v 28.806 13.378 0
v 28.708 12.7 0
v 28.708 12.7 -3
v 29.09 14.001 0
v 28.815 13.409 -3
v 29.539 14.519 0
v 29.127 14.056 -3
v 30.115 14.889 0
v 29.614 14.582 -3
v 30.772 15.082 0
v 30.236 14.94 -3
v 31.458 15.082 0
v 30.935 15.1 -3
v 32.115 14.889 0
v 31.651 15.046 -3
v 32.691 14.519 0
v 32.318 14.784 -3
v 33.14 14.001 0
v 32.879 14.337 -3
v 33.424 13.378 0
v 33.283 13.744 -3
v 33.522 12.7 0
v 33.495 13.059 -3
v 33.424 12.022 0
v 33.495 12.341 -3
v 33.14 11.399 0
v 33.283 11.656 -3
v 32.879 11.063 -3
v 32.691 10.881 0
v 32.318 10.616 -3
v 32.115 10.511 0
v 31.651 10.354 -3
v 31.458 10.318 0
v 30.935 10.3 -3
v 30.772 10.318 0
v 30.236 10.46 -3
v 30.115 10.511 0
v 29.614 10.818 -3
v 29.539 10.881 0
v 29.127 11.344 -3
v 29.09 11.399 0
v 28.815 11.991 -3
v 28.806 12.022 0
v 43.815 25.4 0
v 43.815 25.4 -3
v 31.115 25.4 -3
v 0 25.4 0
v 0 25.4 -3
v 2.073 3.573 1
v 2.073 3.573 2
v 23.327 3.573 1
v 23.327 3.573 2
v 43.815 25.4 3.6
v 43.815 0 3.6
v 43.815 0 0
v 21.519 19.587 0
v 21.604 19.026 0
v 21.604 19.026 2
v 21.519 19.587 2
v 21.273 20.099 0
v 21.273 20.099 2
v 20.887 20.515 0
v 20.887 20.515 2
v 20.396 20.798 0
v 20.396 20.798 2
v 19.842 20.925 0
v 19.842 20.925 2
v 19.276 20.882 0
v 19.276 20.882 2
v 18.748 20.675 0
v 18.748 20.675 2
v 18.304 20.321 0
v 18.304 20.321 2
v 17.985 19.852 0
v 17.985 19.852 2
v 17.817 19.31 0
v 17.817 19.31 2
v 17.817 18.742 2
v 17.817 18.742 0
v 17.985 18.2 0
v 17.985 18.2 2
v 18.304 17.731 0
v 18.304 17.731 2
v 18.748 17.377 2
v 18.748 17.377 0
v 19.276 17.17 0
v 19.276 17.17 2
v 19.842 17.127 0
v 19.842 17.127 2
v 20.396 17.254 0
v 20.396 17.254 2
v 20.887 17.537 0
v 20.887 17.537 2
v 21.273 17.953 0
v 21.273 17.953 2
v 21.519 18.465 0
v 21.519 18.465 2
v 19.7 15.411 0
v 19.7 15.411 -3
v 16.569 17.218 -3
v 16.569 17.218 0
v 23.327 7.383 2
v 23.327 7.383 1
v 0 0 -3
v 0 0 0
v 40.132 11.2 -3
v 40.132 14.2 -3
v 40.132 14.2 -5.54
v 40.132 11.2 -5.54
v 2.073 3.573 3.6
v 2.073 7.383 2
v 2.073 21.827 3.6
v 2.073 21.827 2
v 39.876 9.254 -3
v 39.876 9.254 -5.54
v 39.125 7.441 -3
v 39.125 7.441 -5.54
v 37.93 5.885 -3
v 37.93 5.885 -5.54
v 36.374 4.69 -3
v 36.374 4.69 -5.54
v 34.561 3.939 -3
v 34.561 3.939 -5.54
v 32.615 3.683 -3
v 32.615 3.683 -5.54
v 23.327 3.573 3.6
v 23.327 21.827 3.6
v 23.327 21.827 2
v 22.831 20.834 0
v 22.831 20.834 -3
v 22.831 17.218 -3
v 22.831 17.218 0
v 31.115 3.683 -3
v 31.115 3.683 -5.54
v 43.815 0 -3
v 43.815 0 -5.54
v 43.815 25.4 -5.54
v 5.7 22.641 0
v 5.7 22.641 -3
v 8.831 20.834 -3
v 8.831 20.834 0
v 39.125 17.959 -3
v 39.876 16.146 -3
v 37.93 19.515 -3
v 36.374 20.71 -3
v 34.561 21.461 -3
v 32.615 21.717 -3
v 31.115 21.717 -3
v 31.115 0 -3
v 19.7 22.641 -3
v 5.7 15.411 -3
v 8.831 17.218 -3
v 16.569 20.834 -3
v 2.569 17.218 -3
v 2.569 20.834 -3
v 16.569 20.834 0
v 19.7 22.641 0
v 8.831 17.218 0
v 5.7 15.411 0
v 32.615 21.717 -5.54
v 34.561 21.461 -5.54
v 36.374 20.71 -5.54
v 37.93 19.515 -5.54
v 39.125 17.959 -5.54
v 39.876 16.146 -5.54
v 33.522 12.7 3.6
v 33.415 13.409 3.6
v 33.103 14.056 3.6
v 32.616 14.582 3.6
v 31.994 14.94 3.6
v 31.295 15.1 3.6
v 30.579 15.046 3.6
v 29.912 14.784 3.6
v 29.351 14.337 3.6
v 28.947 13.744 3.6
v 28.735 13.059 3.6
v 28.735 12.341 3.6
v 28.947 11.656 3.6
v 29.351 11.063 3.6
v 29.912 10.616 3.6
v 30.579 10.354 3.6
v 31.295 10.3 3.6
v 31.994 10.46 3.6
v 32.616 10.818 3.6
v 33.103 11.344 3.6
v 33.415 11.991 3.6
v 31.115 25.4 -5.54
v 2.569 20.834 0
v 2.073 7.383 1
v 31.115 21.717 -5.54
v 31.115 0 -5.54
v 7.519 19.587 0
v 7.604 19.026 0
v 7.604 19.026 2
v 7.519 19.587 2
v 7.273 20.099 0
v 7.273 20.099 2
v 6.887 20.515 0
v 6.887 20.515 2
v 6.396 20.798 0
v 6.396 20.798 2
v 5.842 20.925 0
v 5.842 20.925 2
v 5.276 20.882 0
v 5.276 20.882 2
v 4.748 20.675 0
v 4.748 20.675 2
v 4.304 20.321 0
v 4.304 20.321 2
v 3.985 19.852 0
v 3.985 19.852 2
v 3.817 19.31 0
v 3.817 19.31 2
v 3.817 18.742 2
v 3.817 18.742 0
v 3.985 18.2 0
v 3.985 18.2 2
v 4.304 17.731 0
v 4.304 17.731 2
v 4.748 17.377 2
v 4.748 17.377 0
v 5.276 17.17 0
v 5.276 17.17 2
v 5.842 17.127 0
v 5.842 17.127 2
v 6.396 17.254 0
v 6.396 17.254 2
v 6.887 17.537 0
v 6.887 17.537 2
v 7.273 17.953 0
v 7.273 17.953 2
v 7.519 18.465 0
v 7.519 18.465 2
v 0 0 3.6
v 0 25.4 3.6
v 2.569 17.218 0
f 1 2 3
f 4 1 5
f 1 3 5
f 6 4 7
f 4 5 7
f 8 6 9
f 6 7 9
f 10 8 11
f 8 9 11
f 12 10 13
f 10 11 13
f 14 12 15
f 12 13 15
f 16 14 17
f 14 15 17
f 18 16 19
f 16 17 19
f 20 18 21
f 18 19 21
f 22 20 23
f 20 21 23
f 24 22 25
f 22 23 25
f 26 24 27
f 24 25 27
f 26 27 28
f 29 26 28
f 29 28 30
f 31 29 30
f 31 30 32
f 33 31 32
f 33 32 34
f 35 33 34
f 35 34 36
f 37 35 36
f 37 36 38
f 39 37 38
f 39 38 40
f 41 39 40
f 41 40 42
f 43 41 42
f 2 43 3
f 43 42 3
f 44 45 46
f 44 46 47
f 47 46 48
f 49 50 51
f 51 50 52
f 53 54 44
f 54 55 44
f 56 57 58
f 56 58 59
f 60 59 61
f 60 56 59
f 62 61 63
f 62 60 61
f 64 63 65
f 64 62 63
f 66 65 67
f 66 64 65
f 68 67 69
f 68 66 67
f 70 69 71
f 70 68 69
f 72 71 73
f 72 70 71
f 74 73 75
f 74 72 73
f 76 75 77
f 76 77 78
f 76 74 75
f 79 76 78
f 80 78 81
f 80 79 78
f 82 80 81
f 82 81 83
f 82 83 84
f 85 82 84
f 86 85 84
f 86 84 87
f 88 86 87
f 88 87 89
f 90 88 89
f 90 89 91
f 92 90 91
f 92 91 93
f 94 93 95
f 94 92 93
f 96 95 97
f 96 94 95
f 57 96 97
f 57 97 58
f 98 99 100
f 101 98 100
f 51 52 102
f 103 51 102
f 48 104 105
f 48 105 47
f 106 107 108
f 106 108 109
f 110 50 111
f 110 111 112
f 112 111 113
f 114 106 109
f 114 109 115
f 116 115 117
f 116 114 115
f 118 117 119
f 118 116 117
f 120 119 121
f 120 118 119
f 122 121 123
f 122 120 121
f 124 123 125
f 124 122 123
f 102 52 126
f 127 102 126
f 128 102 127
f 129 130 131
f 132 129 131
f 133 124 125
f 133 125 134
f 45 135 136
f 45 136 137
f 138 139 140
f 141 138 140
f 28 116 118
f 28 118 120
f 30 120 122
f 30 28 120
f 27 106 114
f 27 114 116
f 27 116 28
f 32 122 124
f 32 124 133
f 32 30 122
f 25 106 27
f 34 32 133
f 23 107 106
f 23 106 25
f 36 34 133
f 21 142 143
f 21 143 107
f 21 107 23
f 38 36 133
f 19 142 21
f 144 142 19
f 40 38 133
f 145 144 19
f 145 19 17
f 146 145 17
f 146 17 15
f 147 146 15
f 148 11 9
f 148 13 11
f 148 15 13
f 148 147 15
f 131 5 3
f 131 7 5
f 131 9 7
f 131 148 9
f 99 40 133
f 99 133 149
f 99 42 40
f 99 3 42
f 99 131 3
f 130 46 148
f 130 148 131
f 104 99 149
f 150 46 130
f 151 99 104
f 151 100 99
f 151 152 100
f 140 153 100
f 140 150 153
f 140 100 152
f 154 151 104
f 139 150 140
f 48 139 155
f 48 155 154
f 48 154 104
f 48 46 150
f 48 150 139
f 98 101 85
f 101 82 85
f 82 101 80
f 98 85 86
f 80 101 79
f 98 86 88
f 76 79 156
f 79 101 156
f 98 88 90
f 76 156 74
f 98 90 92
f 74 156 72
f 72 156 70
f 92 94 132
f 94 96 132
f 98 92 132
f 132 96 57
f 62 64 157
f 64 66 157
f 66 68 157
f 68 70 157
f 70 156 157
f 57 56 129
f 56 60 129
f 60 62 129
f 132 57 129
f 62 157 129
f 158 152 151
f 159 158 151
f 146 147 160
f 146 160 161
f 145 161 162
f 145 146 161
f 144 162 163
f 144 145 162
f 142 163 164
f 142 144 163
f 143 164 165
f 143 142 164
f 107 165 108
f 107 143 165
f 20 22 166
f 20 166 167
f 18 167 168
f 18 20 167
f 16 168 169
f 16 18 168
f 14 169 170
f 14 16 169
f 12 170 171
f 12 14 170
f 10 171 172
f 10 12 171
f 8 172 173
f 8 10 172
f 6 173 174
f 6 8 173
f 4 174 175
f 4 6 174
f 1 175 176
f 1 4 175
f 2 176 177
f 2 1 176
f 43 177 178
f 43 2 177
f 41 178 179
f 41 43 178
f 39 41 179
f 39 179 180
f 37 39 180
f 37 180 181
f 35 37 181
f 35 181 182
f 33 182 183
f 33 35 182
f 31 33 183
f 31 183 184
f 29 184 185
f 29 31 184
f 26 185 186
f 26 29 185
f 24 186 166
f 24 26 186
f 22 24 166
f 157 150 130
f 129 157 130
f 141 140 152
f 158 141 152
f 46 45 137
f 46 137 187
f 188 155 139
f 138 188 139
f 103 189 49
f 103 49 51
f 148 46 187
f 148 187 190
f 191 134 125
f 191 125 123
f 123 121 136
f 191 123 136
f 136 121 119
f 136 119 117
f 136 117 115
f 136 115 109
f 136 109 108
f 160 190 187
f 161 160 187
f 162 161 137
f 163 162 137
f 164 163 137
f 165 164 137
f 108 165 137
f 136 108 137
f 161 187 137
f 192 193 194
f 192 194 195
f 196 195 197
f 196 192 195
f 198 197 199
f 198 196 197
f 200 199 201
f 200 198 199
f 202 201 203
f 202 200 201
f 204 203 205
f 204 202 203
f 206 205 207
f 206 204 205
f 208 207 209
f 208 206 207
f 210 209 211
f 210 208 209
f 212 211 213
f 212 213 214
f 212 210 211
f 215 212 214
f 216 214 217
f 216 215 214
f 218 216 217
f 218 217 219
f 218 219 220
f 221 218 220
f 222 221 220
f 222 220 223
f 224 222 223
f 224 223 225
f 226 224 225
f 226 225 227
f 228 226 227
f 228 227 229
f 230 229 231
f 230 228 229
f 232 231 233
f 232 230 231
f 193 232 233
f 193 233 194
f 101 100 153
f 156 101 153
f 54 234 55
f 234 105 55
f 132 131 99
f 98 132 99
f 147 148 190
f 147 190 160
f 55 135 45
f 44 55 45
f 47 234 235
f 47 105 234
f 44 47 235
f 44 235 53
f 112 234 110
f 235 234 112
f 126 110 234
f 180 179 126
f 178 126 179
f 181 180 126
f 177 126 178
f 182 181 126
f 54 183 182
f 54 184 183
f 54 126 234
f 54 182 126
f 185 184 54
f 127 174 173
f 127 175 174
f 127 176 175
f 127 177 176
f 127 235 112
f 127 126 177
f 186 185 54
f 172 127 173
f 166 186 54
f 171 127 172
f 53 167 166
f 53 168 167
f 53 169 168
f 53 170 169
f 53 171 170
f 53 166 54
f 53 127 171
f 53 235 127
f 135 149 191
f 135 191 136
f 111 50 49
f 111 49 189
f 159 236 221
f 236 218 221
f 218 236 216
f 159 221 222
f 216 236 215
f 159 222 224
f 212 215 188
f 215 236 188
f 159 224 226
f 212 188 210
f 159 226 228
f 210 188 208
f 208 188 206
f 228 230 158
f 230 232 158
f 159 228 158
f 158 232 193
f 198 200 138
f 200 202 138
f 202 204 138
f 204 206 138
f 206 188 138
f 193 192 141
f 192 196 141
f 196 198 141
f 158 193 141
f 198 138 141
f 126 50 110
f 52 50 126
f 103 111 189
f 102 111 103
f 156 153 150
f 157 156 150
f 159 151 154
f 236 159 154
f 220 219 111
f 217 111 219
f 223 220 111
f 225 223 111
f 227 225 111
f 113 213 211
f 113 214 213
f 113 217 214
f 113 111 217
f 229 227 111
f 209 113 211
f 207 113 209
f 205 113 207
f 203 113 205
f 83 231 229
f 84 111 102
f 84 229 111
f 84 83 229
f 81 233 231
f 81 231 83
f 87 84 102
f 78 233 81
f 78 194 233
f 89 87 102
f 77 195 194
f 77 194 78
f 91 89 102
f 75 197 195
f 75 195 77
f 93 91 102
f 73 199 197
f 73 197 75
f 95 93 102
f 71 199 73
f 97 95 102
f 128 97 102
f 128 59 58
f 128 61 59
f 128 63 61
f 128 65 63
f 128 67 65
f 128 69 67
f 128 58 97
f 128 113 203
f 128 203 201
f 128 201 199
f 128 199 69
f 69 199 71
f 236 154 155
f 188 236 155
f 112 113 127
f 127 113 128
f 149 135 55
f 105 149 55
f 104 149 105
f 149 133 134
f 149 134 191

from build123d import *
from build123d.topology import SkipClean

# Parameters (mm, degrees)
SKETCH1_W           = 43.815
SKETCH1_H           = 25.4
SKETCH1_R           = 1.9039967
SKETCH1_R_2         = 2.40665
BOSS_EXTRUDE1_DEPTH = 2
SKETCH2_W           = 43.815
SKETCH2_H           = 25.4
SKETCH2_R           = 2.40665
SKETCH2_W_2         = 21.254
SKETCH2_H_2         = 18.254
BOSS_EXTRUDE2_DEPTH = 1.6
BOSS_EXTRUDE3_START = 3
SKETCH3_W           = 43.815
SKETCH3_H           = 25.4
SKETCH3_R           = 2.40665
BOSS_EXTRUDE3_DEPTH = 3
BOSS_EXTRUDE4_DEPTH = 2.54
SKETCH5_W           = 21.254
SKETCH5_H           = 3.81
CUT_EXTRUDE1_DEPTH  = 1


with BuildPart() as part:
    # Sketch1 → Boss-Extrude1 (new body)
    with BuildSketch(Plane.XY):
        with Locations((21.9075, 12.7)):
            Rectangle(SKETCH1_W, SKETCH1_H)
        with Locations((5.7, 19.026000048)):
            Circle(SKETCH1_R, mode=Mode.SUBTRACT)
        with Locations((19.7, 19.026000048)):
            Circle(SKETCH1_R, mode=Mode.SUBTRACT)
        with Locations((31.115, 12.7)):
            Circle(SKETCH1_R_2, mode=Mode.SUBTRACT)
    extrude(amount=BOSS_EXTRUDE1_DEPTH)

    # Sketch2 → Boss-Extrude2 (add)
    with BuildSketch(Plane.XY.offset(2)):
        with Locations((21.9075, 12.7)):
            Rectangle(SKETCH2_W, SKETCH2_H)
        with Locations((31.115, 12.7)):
            Circle(SKETCH2_R, mode=Mode.SUBTRACT)
        with Locations((12.7, 12.7)):
            Rectangle(SKETCH2_W_2, SKETCH2_H_2, mode=Mode.SUBTRACT)
    extrude(amount=BOSS_EXTRUDE2_DEPTH)

    # Sketch3 → Boss-Extrude3 (add)
    with SkipClean():  # the faces are left unmerged after this step: merging them gives an invalid solid
        with BuildSketch(Plane(origin=(0, 0, 0), x_dir=(-1, 0, 0), z_dir=(0, 0, -1)).offset(BOSS_EXTRUDE3_START)):
            with Locations((-21.9075, 12.7)):
                Rectangle(SKETCH3_W, SKETCH3_H)
            with Locations((-31.115, 12.7)):
                Circle(SKETCH3_R, mode=Mode.SUBTRACT)
            Polygon((-16.5690055, 17.218319531), (-16.5690055, 20.833680565), (-19.7, 22.641361083), (-22.8309945, 20.833680565), (-22.8309945, 17.218319531), (-19.7, 15.410639013), align=None, mode=Mode.SUBTRACT)
            Polygon((-2.5690055, 20.833680565), (-5.7, 22.641361083), (-8.8309945, 20.833680565), (-8.8309945, 17.218319531), (-5.7, 15.410639013), (-2.5690055, 17.218319531), align=None, mode=Mode.SUBTRACT)
        extrude(amount=-BOSS_EXTRUDE3_DEPTH)

    # Sketch4 → Boss-Extrude4 (add)
    with SkipClean():  # the faces are left unmerged after this step: merging them gives an invalid solid
        with BuildSketch(Plane(origin=(0, 0, -3), x_dir=(-1, 0, 0), z_dir=(0, 0, -1))):
            with BuildLine():
                Line((-31.115, 25.4), (-31.115, 21.717))
                Line((-31.115, 21.717), (-32.615185644, 21.717))
                ThreePointArc((-32.615185644, 21.717), (-37.930376048, 19.515376048), (-40.132, 14.200185644))
                Line((-40.132, 14.200185644), (-40.132, 11.199814356))
                ThreePointArc((-40.132, 11.199814356), (-37.930376048, 5.884623952), (-32.615185644, 3.683))
                Line((-32.615185644, 3.683), (-31.115, 3.683))
                Line((-31.115, 3.683), (-31.115, 0))
                Line((-31.115, 0), (-43.815, 0))
                Line((-43.815, 0), (-43.815, 25.4))
                Line((-43.815, 25.4), (-31.115, 25.4))
            make_face()
        extrude(amount=BOSS_EXTRUDE4_DEPTH)

    # Sketch5 → Cut-Extrude1 (cut)
    with SkipClean():  # the faces are left unmerged after this step: merging them gives an invalid solid
        with BuildSketch(Plane.XY.offset(2)):
            with Locations((12.7, 5.478)):
                Rectangle(SKETCH5_W, SKETCH5_H)
        extrude(amount=-CUT_EXTRUDE1_DEPTH, mode=Mode.SUBTRACT)


solid = part.part
